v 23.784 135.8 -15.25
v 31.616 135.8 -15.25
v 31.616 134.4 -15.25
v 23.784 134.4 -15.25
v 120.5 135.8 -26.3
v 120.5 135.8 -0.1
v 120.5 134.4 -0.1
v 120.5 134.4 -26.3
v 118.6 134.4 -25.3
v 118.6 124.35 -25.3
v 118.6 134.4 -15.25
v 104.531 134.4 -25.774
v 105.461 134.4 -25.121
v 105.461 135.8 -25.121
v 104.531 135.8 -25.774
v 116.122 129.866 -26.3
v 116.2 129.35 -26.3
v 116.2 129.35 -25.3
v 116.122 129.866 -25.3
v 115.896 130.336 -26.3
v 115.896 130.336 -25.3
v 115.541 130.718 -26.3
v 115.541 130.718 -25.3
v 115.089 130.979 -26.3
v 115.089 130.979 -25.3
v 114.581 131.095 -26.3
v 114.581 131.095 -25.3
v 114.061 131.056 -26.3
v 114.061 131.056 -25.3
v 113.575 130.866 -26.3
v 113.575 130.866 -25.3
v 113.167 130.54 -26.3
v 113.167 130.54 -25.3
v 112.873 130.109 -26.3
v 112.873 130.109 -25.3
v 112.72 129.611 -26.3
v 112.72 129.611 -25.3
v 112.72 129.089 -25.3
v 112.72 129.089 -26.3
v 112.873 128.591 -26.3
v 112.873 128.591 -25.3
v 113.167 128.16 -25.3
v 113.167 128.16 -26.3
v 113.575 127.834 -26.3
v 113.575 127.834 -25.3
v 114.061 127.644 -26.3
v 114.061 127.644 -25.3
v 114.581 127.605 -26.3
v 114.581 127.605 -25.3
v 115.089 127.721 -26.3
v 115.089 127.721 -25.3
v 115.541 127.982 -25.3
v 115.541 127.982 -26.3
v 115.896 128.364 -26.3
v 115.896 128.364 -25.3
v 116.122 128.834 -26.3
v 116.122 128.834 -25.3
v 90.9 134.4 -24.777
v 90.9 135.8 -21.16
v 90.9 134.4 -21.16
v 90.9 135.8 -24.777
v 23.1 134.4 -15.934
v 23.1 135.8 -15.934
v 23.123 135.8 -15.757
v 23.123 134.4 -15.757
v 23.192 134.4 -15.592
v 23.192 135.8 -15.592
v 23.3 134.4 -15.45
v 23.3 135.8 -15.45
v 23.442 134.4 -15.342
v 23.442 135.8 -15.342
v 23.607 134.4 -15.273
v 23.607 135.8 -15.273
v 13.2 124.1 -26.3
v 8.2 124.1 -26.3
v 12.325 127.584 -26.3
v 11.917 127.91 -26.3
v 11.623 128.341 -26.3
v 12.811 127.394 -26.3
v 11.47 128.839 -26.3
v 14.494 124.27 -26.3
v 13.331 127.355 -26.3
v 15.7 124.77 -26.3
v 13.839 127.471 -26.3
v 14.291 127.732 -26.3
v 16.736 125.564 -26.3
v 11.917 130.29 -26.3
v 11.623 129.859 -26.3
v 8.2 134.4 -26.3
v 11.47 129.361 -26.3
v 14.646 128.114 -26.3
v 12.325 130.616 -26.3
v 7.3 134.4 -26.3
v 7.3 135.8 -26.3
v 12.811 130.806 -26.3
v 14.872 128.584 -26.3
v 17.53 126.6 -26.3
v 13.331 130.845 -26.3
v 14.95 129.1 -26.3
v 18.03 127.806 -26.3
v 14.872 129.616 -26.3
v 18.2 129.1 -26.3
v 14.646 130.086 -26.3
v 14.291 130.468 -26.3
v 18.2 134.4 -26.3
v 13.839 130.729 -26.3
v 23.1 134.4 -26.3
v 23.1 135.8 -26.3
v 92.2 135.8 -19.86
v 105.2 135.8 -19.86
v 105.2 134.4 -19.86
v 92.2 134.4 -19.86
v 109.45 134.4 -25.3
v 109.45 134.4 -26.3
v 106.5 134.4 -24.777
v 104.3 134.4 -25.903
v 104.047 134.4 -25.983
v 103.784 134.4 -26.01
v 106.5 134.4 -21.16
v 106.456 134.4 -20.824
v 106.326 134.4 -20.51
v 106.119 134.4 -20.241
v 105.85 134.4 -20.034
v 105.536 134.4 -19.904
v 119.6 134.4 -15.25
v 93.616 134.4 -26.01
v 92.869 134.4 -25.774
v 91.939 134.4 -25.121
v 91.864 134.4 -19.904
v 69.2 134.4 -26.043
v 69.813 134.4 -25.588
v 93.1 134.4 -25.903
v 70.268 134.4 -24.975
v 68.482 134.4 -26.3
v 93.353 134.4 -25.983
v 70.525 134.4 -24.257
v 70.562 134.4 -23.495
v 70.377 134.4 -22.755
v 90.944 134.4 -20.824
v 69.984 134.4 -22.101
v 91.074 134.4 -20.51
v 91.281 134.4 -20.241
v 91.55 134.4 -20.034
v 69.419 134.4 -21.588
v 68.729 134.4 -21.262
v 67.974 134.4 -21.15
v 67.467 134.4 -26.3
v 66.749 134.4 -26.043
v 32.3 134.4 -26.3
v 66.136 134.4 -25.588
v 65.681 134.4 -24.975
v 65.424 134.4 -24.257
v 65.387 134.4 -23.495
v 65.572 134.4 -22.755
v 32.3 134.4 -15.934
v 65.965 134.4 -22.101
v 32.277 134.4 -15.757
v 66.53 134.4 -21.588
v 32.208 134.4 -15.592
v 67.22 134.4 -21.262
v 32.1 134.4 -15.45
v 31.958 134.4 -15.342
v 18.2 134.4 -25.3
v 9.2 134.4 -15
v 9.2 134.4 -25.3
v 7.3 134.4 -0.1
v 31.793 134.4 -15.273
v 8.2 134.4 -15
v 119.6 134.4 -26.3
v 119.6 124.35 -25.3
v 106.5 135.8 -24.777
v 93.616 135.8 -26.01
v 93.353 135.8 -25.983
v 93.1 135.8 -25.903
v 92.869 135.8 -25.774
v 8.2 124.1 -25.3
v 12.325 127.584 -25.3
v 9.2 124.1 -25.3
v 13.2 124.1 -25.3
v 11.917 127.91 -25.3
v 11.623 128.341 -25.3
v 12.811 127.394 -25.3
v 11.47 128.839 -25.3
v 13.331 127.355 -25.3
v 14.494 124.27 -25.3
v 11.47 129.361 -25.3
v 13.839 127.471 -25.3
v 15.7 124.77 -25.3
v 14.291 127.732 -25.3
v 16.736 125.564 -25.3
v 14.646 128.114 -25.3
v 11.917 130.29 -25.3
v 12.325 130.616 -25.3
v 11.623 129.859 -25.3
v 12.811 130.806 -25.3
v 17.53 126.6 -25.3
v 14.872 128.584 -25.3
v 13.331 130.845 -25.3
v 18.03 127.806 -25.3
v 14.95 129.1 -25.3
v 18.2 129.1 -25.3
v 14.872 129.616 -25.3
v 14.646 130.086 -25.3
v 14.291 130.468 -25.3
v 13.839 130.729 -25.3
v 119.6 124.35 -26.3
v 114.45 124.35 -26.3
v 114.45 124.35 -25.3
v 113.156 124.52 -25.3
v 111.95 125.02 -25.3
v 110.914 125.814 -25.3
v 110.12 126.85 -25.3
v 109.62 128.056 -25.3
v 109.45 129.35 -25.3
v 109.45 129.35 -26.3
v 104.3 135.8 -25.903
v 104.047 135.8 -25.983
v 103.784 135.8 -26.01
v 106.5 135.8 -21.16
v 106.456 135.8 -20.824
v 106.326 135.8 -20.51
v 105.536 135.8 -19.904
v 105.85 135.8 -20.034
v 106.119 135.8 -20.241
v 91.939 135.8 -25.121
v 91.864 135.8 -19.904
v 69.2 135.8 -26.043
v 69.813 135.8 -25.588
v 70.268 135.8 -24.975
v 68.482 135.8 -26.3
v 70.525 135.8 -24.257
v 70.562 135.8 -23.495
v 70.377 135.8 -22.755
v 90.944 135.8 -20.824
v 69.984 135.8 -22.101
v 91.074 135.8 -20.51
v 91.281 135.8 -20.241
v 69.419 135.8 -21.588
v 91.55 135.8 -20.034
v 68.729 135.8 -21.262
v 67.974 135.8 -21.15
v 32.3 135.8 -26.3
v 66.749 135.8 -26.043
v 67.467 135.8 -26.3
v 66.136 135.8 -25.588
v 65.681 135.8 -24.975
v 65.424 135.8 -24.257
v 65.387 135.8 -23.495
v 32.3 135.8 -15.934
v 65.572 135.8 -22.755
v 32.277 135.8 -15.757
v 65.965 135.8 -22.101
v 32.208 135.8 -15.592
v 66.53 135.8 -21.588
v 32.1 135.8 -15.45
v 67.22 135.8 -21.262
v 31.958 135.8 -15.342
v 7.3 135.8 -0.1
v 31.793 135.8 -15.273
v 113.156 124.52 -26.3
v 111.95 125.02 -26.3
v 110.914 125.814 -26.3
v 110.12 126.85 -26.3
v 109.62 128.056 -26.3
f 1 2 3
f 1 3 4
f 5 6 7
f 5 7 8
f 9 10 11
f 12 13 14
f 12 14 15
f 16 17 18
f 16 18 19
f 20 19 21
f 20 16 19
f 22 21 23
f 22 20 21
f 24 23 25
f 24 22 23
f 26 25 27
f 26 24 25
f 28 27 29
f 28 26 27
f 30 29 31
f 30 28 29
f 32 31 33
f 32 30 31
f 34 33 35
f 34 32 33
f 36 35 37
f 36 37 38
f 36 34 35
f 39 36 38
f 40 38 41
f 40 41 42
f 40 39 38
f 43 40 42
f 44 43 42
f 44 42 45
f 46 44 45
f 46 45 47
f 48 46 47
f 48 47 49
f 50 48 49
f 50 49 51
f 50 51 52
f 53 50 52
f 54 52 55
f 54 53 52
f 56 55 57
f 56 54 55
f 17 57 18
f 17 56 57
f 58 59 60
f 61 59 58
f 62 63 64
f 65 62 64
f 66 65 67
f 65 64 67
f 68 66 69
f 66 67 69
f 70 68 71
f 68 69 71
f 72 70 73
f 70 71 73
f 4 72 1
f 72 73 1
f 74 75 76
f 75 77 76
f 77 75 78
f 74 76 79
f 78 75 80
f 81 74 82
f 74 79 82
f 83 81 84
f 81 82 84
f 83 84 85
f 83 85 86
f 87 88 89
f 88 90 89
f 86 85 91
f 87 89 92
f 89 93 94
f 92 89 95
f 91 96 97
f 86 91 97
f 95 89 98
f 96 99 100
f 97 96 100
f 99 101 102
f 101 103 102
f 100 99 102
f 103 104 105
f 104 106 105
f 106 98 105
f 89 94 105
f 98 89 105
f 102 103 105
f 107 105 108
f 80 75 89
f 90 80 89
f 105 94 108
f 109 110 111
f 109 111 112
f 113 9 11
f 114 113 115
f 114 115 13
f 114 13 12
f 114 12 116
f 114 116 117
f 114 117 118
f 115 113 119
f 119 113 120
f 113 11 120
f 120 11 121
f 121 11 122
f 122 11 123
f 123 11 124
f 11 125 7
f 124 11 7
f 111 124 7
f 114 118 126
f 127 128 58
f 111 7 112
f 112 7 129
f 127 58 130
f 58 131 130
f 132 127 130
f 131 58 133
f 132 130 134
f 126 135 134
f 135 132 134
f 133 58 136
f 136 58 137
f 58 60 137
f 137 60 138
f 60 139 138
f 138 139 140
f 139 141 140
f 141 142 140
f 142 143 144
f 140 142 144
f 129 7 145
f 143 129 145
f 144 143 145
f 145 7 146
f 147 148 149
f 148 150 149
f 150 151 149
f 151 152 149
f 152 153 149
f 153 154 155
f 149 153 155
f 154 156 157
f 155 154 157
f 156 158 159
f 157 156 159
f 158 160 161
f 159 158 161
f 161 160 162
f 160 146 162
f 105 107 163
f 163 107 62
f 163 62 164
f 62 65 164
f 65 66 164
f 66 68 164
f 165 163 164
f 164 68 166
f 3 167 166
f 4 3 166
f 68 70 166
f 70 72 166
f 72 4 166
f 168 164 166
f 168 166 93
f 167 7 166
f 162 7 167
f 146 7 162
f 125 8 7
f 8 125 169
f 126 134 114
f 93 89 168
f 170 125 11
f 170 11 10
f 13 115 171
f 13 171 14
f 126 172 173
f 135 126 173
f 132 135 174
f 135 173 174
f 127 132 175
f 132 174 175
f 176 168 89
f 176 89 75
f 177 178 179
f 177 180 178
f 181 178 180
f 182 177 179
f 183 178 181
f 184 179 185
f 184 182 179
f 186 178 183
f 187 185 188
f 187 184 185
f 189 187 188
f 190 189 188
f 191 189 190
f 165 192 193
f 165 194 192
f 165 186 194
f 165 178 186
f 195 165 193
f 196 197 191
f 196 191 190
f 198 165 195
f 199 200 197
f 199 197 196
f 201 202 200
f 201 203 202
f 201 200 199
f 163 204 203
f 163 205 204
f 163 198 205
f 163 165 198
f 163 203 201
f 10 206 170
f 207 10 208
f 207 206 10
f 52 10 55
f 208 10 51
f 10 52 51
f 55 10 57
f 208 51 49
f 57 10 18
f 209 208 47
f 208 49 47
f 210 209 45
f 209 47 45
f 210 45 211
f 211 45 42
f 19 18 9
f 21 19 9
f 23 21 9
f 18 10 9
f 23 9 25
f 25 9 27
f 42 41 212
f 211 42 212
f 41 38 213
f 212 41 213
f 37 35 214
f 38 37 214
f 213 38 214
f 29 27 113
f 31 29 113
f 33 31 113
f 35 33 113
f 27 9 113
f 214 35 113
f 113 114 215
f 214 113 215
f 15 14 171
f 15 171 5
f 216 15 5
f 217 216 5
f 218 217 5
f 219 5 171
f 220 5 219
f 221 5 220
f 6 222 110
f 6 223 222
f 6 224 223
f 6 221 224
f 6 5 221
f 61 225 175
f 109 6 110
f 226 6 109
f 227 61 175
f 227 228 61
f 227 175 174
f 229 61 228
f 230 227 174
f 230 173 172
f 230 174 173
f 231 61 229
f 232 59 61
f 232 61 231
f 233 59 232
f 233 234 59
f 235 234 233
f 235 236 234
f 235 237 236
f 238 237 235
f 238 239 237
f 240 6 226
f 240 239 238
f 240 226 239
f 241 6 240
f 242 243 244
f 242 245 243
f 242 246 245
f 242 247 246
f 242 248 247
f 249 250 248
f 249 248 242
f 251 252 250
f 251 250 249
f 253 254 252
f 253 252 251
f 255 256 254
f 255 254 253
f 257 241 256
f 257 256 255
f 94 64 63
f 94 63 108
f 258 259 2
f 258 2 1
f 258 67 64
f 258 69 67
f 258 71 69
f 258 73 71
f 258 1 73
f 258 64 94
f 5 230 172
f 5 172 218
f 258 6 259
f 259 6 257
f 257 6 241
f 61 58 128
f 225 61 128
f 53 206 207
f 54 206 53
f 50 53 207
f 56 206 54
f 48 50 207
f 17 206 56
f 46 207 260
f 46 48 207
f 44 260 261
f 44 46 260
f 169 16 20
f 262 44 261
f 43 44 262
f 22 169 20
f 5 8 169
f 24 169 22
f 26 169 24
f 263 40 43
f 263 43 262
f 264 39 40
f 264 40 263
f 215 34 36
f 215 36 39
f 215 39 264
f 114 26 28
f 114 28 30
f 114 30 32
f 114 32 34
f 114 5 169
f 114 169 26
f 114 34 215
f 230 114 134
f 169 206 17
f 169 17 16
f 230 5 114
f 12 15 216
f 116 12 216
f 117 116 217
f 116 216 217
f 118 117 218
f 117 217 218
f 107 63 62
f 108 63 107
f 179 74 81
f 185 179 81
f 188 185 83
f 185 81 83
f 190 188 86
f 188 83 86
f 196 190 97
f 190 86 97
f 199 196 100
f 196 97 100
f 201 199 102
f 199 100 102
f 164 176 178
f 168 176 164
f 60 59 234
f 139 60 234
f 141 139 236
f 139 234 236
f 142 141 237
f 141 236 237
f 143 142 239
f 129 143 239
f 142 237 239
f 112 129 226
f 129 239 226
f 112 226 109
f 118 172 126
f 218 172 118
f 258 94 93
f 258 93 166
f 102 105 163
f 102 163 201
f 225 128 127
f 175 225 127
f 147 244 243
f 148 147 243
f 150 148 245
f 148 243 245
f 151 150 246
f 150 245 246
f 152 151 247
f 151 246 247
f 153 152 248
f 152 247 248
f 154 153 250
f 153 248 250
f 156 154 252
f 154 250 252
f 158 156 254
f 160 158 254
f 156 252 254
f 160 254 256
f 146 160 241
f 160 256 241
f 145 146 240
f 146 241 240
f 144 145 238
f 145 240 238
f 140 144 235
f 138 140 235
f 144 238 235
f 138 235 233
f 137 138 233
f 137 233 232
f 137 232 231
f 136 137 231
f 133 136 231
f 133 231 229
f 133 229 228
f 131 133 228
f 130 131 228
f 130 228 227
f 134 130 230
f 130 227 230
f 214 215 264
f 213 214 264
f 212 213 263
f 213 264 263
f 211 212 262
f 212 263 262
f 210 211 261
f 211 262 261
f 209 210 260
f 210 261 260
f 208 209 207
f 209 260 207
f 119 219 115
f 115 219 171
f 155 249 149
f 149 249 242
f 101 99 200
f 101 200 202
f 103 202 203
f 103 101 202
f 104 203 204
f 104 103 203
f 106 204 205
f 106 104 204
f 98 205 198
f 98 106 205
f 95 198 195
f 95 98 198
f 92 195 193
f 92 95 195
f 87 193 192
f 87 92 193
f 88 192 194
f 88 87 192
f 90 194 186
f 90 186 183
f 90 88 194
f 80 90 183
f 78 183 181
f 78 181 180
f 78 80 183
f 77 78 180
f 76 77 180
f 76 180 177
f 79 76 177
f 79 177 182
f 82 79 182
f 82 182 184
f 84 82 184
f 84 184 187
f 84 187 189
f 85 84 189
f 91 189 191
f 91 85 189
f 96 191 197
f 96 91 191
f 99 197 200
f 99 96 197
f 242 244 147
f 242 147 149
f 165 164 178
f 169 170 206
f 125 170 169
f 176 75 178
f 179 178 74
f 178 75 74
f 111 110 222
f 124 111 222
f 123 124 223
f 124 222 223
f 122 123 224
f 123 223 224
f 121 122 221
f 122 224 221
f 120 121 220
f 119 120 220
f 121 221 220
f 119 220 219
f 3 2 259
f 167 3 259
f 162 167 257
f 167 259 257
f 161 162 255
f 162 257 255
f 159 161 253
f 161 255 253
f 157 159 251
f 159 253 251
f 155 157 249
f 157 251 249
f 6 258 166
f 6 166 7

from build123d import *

# Parameters (mm, degrees)
PAD028_DEPTH = 1.4
SKETCH048_R  = 1.75
PAD029_DEPTH = 1
PAD030_DEPTH = 1
PAD031_DEPTH = 1


with BuildPart() as part:
    # Sketch047 (on Face725 of Binder021) → Pad028 (new body)
    with BuildSketch(Plane(origin=(0, 135.8, 0), x_dir=(-1, 0, 0), z_dir=(0, 1, 0))):
        with BuildLine():
            Line((-120.499982, -0.1), (-120.499982, -26.3))
            Line((-120.499982, -26.3), (-68.48194, -26.3))
            ThreePointArc((-67.46705, -26.3), (-67.974495, -21.15), (-68.48194, -26.3))
            Line((-67.46705, -26.3), (-32.299995, -26.3))
            Line((-32.299995, -15.934266), (-32.299995, -26.3))
            ThreePointArc((-31.615729, -15.25), (-32.099578, -15.450417), (-32.299995, -15.934266))
            Line((-31.615729, -15.25), (-23.784261, -15.25))
            ThreePointArc((-23.099995, -15.934266), (-23.300412, -15.450417), (-23.784261, -15.25))
            Line((-23.099995, -15.934266), (-23.099995, -26.3))
            Line((-7.299995, -26.3), (-23.099995, -26.3))
            Line((-7.299995, -26.3), (-7.299995, -0.1))
            Line((-7.299995, -0.1), (-120.499982, -0.1))
        make_face()
        with BuildLine():
            Line((-105.199995, -19.86), (-92.199994, -19.86))
            ThreePointArc((-90.899995, -21.16), (-91.280756, -20.240762), (-92.199994, -19.86))
            Line((-90.899995, -21.16), (-90.899995, -24.776619))
            Line((-90.899995, -24.776619), (-91.938732, -25.120886))
            Line((-91.938732, -25.120886), (-92.869018, -25.773985))
            ThreePointArc((-93.61597, -26.01), (-93.224294, -25.949593), (-92.869018, -25.773985))
            Line((-93.61597, -26.01), (-103.78402, -26.01))
            ThreePointArc((-104.530977, -25.773981), (-104.175699, -25.949592), (-103.78402, -26.01))
            Line((-105.461258, -25.120886), (-104.530977, -25.773981))
            Line((-106.499995, -24.776619), (-105.461258, -25.120886))
            Line((-106.499995, -21.16), (-106.499995, -24.776619))
            ThreePointArc((-105.199995, -19.86), (-106.119234, -20.240761), (-106.499995, -21.16))
        make_face(mode=Mode.SUBTRACT)
    extrude(amount=-PAD028_DEPTH)

    # Sketch048 (on Face5 of Binder022) → Pad029 (join)
    with BuildSketch(Plane.XY.offset(-26.3)):
        with BuildLine():
            Line((18.199995, 134.4), (8.199995, 134.4))
            Line((8.199995, 134.4), (8.199995, 124.1))
            Line((8.199995, 124.1), (13.199995, 124.1))
            ThreePointArc((13.199995, 124.1), (16.735529, 125.564466), (18.199995, 129.1))
            Line((18.199995, 134.4), (18.199995, 129.1))
        make_face()
        with Locations((13.199995, 129.1)):
            Circle(SKETCH048_R, mode=Mode.SUBTRACT)
        with BuildLine():
            Line((109.449995, 134.4), (119.599982, 134.4))
            Line((119.599982, 134.4), (119.599982, 124.35))
            Line((119.599982, 124.35), (114.449995, 124.35))
            ThreePointArc((109.449995, 129.35), (110.914461, 125.814466), (114.449995, 124.35))
            Line((109.449995, 134.4), (109.449995, 129.35))
        make_face()
        with Locations((114.449995, 129.35)):
            Circle(SKETCH048_R, mode=Mode.SUBTRACT)
    extrude(amount=PAD029_DEPTH)

    # Sketch049 (on Face25 of Pad029) → Pad030 (join)
    with BuildSketch(Plane(origin=(8.199995, 0, 0), x_dir=(0, -1, 0), z_dir=(-1, 0, 0))):
        Polygon((-134.4, -25.3), (-124.1, -25.3), (-134.4, -15), align=None)
    extrude(amount=-PAD030_DEPTH)

    # Sketch050 (on Face36 of Pad030) → Pad031 (join)
    with BuildSketch(Plane.YZ.offset(119.599982)):
        Polygon((124.35, -25.3), (134.4, -25.3), (134.4, -15.25), align=None)
    extrude(amount=-PAD031_DEPTH)


solid = part.part
